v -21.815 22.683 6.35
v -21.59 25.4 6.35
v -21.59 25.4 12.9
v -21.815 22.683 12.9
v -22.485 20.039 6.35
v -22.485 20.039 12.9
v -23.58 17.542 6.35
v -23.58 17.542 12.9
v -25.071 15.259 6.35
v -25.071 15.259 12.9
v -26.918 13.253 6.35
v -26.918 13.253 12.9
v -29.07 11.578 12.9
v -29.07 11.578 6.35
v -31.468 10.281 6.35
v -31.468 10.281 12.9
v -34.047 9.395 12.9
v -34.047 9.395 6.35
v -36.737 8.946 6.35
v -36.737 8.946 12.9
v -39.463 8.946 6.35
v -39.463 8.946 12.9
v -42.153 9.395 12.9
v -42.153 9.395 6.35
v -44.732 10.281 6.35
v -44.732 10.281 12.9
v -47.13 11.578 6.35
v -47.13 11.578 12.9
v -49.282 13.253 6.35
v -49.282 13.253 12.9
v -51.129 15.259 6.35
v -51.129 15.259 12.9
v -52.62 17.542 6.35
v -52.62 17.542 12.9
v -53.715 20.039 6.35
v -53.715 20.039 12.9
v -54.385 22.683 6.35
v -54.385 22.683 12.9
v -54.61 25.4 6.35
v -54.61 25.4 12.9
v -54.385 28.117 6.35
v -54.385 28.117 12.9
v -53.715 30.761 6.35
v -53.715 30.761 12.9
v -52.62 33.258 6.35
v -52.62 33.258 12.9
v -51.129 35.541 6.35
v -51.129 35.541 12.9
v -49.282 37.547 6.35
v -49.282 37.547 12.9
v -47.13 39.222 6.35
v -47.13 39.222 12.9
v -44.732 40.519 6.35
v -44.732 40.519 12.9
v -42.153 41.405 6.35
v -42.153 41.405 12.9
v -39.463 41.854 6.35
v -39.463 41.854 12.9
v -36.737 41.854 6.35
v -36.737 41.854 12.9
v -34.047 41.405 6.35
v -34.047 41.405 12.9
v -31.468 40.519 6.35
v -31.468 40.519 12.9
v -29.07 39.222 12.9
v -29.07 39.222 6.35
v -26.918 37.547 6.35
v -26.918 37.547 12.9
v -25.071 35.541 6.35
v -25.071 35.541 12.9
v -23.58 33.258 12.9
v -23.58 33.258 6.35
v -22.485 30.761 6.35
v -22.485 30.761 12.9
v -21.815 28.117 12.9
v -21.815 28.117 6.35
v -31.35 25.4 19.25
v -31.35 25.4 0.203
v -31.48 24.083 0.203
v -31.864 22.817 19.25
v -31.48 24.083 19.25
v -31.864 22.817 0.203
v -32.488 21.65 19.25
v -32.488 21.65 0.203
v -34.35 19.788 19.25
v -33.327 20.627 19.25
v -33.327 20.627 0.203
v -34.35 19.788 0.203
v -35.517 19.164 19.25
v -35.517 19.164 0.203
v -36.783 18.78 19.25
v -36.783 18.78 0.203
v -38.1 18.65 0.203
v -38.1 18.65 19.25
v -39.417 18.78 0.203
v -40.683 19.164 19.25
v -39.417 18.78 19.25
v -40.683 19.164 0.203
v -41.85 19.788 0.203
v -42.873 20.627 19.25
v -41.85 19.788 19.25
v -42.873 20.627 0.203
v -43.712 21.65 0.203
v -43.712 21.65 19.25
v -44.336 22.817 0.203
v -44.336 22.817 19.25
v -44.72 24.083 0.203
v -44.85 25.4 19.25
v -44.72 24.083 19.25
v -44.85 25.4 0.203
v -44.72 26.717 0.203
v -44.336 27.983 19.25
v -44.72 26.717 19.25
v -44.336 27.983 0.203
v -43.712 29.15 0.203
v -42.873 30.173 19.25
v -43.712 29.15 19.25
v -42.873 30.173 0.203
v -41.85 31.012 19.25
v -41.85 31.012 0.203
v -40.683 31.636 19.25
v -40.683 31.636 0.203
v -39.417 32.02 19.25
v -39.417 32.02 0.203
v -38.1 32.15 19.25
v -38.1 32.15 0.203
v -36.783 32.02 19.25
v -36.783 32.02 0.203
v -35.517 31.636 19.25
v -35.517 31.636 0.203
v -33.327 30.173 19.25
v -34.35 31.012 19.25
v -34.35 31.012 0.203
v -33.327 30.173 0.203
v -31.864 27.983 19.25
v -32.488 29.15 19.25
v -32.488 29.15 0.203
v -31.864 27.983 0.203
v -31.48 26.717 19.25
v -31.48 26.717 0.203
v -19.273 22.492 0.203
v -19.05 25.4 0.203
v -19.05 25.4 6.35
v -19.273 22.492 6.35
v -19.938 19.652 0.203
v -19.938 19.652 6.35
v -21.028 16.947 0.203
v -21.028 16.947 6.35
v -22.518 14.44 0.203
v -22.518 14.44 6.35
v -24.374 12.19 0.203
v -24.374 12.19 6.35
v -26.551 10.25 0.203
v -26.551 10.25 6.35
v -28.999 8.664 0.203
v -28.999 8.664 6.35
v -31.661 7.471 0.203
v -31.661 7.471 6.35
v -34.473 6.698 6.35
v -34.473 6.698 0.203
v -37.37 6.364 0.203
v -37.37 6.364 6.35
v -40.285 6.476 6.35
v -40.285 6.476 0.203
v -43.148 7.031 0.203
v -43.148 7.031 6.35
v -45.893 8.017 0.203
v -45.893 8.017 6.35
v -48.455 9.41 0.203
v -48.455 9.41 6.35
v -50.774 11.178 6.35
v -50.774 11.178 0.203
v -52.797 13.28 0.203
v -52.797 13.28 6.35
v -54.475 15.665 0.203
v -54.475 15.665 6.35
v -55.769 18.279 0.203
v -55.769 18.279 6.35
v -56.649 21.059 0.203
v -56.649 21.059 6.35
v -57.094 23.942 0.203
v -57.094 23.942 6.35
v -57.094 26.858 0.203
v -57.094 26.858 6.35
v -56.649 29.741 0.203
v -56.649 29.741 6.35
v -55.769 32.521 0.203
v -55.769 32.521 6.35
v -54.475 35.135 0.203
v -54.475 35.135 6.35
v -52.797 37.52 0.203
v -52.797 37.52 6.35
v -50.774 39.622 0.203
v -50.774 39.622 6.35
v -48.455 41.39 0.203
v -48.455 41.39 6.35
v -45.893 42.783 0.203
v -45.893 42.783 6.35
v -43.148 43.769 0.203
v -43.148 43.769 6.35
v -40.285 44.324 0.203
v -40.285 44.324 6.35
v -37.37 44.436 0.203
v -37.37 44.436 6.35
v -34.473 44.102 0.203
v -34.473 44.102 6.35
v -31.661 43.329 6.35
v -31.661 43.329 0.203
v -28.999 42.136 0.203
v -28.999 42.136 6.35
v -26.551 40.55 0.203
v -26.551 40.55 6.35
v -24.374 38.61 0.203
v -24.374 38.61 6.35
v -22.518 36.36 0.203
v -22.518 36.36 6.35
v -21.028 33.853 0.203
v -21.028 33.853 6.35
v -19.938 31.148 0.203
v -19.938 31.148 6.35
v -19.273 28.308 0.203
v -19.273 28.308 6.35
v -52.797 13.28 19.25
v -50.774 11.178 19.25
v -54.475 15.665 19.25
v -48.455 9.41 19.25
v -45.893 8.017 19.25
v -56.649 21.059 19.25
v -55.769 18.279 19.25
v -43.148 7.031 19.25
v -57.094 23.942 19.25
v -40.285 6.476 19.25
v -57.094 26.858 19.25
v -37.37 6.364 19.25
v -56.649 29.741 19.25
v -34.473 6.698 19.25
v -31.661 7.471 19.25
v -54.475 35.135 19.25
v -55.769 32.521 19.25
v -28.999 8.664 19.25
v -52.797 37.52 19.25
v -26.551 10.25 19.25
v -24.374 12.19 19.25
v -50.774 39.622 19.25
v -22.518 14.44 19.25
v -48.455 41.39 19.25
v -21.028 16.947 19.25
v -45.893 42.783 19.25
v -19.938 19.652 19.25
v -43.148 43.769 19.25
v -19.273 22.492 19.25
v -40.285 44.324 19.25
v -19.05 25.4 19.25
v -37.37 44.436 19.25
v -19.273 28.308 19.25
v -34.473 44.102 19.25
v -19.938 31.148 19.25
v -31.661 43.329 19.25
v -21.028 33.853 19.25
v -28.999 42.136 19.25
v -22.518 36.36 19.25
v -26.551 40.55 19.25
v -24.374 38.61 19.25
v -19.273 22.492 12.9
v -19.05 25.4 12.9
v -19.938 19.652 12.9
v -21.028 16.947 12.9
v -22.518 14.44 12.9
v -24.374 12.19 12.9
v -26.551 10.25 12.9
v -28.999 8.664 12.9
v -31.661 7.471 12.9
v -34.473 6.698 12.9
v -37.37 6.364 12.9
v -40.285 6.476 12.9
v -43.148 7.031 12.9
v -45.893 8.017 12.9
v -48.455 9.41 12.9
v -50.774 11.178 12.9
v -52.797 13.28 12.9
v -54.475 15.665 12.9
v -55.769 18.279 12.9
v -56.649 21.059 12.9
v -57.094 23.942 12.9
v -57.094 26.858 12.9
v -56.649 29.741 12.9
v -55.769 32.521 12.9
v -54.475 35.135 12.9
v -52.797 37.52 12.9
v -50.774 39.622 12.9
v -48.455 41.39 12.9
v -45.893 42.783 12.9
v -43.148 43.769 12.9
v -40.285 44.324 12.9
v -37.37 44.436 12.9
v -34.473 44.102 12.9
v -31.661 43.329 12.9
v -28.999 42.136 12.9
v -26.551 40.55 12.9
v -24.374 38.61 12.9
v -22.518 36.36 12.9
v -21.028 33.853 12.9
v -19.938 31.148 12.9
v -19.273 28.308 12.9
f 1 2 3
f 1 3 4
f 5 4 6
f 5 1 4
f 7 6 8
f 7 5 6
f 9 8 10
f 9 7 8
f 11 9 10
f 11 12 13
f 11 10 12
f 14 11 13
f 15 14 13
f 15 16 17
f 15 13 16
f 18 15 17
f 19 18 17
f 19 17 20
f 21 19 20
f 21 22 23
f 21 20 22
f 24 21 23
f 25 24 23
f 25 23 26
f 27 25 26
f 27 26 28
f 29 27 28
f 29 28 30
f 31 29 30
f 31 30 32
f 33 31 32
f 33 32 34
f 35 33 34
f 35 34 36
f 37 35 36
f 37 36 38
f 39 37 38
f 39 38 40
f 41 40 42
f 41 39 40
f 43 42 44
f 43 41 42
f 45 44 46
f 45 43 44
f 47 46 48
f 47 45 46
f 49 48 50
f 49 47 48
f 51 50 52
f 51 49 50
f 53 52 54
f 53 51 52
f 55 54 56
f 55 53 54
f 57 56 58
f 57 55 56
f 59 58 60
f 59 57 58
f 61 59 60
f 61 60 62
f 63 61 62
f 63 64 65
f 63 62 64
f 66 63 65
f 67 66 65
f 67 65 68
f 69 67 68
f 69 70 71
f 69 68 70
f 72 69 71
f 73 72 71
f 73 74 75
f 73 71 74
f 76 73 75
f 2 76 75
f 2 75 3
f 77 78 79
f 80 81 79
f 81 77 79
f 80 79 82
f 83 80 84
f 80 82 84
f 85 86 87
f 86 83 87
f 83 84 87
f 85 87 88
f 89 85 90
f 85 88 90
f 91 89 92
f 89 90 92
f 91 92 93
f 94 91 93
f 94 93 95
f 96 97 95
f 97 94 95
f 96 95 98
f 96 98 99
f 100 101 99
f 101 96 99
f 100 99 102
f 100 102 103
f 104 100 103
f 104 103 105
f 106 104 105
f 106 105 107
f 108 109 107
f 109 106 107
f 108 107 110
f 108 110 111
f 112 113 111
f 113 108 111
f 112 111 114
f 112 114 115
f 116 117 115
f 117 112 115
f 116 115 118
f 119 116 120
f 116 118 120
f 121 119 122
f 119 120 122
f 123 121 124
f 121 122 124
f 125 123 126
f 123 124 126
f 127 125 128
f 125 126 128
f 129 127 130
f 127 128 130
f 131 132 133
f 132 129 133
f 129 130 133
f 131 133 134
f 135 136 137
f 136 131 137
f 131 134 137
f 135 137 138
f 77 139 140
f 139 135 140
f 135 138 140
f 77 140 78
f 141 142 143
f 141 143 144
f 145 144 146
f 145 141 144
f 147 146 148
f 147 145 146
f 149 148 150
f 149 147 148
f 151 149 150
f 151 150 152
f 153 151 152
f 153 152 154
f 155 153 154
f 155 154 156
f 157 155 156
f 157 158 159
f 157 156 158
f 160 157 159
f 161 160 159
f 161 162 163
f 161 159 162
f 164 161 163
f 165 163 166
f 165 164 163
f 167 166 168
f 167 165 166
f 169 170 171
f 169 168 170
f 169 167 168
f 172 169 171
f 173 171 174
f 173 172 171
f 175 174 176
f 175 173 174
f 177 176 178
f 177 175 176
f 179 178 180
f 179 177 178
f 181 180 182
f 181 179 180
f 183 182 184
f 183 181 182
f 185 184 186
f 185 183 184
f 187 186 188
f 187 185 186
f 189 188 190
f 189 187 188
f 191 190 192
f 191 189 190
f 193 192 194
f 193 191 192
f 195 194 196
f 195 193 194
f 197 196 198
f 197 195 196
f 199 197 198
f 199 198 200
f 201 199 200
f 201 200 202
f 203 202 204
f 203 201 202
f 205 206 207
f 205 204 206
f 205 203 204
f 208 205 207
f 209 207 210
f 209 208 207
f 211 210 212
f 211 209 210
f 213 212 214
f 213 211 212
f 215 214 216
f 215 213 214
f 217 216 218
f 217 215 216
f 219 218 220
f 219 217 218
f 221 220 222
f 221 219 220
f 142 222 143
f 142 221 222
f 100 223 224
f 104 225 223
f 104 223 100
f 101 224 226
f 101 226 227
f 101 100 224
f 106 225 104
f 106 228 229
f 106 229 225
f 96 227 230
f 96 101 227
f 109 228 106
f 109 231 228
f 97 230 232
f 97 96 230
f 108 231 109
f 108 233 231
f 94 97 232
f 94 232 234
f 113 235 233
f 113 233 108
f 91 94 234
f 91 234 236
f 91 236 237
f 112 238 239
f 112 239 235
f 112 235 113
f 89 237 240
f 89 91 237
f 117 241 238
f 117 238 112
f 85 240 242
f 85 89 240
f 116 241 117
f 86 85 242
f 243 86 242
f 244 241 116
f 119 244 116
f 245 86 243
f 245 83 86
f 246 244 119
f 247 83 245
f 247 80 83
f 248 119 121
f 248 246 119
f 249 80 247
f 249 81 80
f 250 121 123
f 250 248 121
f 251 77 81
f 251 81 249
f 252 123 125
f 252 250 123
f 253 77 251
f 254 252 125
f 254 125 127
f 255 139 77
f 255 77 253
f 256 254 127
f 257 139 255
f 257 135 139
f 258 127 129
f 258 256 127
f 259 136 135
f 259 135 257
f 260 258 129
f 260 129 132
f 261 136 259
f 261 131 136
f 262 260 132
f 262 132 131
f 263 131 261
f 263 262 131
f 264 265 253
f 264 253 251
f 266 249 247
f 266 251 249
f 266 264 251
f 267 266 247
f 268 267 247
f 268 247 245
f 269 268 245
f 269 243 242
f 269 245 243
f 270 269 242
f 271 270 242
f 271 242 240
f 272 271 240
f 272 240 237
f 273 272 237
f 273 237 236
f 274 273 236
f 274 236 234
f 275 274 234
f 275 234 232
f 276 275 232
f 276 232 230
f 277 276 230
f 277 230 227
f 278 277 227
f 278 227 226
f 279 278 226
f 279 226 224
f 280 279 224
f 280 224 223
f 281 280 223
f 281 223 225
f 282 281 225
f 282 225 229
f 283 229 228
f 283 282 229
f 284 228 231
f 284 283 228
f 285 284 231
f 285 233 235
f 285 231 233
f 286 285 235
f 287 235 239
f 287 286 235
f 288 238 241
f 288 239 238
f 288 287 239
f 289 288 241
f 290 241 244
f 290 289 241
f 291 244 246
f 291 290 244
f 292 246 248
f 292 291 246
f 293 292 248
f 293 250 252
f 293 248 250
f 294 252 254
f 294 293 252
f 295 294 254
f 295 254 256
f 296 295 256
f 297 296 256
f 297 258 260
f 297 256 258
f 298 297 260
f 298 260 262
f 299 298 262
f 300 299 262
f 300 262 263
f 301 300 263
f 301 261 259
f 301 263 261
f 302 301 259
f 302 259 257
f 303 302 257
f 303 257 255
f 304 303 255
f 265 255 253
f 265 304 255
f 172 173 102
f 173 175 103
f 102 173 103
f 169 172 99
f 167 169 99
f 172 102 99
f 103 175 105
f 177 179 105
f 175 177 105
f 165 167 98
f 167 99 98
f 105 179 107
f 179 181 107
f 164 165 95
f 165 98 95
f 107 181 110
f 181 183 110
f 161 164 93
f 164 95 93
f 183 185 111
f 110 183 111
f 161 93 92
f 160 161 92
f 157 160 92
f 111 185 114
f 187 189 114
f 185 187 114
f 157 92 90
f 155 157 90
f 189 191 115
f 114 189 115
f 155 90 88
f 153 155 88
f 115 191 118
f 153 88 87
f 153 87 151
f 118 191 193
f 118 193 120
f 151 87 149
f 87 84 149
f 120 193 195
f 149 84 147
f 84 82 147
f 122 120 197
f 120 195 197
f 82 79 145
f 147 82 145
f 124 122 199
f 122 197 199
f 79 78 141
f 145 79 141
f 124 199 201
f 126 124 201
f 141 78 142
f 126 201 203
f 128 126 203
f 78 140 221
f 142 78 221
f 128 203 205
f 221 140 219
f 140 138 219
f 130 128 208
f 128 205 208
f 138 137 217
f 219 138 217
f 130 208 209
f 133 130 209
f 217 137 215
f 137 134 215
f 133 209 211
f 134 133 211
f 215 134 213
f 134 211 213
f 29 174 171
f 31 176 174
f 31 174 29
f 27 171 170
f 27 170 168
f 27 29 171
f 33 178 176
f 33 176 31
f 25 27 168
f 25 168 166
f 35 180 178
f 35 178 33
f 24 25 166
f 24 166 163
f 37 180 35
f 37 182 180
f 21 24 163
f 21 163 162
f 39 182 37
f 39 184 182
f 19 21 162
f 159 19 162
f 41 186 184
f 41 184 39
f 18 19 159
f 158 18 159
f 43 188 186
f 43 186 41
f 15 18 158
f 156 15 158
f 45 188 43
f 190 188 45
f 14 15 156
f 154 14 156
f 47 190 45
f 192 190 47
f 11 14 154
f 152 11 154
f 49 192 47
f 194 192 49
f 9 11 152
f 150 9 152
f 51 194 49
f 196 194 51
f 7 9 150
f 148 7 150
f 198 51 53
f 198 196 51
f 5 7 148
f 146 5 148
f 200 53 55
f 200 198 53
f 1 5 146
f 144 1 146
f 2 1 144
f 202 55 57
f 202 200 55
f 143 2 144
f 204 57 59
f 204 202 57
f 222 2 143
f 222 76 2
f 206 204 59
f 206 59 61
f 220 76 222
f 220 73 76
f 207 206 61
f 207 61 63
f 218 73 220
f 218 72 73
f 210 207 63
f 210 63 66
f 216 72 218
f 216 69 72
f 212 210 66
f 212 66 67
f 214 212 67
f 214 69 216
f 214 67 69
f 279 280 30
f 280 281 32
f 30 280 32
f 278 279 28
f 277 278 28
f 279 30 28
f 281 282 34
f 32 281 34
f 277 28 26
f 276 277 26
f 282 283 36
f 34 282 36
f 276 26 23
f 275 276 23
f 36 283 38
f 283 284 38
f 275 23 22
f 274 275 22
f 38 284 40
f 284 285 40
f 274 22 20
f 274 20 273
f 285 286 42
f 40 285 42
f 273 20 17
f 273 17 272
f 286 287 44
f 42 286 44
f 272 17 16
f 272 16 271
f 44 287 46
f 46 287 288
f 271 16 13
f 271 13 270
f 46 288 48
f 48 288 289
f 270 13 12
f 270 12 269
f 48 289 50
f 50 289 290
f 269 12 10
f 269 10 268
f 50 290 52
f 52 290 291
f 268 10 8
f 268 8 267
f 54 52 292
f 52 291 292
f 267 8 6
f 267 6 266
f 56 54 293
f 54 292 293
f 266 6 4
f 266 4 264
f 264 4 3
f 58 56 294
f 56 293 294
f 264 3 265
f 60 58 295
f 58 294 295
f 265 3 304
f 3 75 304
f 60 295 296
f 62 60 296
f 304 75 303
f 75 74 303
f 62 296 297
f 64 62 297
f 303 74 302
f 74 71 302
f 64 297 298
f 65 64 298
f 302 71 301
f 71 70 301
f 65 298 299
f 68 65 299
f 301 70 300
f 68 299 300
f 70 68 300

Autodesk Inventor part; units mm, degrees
ref_plane "Work Plane1" through (0, 0, 0.2032) normal (0, 0, 1) x (1, 0, 0)
sketch "Sketch1" plane through (0, 0, 0.2032) normal (0, 0, 1) x (1, 0, 0)
  circle A0 centre (-38.1, 25.4) radius 6.35 construction
  circle A1 centre (-38.1, -25.4) radius 6.35 projected
  circle A2 centre (-38.1, 25.4) radius 6.35 construction
  circle A3 centre (-38.1, 25.4) radius 6.75
  circle A4 centre (-38.1, 25.4) radius 19.05 construction
  circle A5 centre (-38.1, 25.4) radius 19.05
  point P0 (0, 0)
  dimension "d0" = 0.4
ref_plane "Work Plane2" through (-44.45, 19.05, 25.4) normal (0, 0, 1) x (1, 0, 0)
ref_plane "Work Plane3" through (-48.5775, -83.82, 6.35) normal (0, 0, 1) x (1, 0, 0)
extrude "Extrusion1" add sketch "Sketch1" along normal up to surface (6.1468 mm away) contours A5
sketch "Sketch2" plane through (-38.1, 25.4, 6.35) normal (0, 0, 1) x (1, 0, 0)
  circle A0 centre (0, 0) radius 6.75 projected
  circle A1 centre (0, 0) radius 19.05 projected
  circle A2 centre (0, 0) radius 16.51
  point P0 (38.1, -25.4)
  dimension "d3" = 2.54
ref_plane "Work Plane4" through (-45.085, 18.415, 12.9) normal (0, 0, 1) x (1, 0, 0)
extrude "Extrusion2" add sketch "Sketch2" along normal up to surface (6.55 mm away) contours A2
sketch "Sketch3" plane through (-38.1, 25.4, 12.9) normal (0, 0, 1) x (1, 0, 0)
  circle A0 centre (0, 0) radius 6.75 projected
  circle A1 centre (0, 0) radius 16.51 projected
  circle A2 centre (0, 0) radius 19.05 projected
  circle A3 centre (0, 0) radius 16.51 projected
  circle A4 centre (0, 0) radius 19.05 projected
  point P0 (38.1, -25.4)
ref_plane "Work Plane5" through (-44.45, 19.05, 19.25) normal (0, 0, 1) x (1, 0, 0)
ref_plane "Work Plane6" through (-44.45, 19.05, 19.25) normal (0, 0, 1) x (1, 0, 0)
extrude "Extrusion3" add sketch "Sketch3" along normal up to surface (6.35 mm away) contours A1 | A2
properties part number "Cart Wheel"
